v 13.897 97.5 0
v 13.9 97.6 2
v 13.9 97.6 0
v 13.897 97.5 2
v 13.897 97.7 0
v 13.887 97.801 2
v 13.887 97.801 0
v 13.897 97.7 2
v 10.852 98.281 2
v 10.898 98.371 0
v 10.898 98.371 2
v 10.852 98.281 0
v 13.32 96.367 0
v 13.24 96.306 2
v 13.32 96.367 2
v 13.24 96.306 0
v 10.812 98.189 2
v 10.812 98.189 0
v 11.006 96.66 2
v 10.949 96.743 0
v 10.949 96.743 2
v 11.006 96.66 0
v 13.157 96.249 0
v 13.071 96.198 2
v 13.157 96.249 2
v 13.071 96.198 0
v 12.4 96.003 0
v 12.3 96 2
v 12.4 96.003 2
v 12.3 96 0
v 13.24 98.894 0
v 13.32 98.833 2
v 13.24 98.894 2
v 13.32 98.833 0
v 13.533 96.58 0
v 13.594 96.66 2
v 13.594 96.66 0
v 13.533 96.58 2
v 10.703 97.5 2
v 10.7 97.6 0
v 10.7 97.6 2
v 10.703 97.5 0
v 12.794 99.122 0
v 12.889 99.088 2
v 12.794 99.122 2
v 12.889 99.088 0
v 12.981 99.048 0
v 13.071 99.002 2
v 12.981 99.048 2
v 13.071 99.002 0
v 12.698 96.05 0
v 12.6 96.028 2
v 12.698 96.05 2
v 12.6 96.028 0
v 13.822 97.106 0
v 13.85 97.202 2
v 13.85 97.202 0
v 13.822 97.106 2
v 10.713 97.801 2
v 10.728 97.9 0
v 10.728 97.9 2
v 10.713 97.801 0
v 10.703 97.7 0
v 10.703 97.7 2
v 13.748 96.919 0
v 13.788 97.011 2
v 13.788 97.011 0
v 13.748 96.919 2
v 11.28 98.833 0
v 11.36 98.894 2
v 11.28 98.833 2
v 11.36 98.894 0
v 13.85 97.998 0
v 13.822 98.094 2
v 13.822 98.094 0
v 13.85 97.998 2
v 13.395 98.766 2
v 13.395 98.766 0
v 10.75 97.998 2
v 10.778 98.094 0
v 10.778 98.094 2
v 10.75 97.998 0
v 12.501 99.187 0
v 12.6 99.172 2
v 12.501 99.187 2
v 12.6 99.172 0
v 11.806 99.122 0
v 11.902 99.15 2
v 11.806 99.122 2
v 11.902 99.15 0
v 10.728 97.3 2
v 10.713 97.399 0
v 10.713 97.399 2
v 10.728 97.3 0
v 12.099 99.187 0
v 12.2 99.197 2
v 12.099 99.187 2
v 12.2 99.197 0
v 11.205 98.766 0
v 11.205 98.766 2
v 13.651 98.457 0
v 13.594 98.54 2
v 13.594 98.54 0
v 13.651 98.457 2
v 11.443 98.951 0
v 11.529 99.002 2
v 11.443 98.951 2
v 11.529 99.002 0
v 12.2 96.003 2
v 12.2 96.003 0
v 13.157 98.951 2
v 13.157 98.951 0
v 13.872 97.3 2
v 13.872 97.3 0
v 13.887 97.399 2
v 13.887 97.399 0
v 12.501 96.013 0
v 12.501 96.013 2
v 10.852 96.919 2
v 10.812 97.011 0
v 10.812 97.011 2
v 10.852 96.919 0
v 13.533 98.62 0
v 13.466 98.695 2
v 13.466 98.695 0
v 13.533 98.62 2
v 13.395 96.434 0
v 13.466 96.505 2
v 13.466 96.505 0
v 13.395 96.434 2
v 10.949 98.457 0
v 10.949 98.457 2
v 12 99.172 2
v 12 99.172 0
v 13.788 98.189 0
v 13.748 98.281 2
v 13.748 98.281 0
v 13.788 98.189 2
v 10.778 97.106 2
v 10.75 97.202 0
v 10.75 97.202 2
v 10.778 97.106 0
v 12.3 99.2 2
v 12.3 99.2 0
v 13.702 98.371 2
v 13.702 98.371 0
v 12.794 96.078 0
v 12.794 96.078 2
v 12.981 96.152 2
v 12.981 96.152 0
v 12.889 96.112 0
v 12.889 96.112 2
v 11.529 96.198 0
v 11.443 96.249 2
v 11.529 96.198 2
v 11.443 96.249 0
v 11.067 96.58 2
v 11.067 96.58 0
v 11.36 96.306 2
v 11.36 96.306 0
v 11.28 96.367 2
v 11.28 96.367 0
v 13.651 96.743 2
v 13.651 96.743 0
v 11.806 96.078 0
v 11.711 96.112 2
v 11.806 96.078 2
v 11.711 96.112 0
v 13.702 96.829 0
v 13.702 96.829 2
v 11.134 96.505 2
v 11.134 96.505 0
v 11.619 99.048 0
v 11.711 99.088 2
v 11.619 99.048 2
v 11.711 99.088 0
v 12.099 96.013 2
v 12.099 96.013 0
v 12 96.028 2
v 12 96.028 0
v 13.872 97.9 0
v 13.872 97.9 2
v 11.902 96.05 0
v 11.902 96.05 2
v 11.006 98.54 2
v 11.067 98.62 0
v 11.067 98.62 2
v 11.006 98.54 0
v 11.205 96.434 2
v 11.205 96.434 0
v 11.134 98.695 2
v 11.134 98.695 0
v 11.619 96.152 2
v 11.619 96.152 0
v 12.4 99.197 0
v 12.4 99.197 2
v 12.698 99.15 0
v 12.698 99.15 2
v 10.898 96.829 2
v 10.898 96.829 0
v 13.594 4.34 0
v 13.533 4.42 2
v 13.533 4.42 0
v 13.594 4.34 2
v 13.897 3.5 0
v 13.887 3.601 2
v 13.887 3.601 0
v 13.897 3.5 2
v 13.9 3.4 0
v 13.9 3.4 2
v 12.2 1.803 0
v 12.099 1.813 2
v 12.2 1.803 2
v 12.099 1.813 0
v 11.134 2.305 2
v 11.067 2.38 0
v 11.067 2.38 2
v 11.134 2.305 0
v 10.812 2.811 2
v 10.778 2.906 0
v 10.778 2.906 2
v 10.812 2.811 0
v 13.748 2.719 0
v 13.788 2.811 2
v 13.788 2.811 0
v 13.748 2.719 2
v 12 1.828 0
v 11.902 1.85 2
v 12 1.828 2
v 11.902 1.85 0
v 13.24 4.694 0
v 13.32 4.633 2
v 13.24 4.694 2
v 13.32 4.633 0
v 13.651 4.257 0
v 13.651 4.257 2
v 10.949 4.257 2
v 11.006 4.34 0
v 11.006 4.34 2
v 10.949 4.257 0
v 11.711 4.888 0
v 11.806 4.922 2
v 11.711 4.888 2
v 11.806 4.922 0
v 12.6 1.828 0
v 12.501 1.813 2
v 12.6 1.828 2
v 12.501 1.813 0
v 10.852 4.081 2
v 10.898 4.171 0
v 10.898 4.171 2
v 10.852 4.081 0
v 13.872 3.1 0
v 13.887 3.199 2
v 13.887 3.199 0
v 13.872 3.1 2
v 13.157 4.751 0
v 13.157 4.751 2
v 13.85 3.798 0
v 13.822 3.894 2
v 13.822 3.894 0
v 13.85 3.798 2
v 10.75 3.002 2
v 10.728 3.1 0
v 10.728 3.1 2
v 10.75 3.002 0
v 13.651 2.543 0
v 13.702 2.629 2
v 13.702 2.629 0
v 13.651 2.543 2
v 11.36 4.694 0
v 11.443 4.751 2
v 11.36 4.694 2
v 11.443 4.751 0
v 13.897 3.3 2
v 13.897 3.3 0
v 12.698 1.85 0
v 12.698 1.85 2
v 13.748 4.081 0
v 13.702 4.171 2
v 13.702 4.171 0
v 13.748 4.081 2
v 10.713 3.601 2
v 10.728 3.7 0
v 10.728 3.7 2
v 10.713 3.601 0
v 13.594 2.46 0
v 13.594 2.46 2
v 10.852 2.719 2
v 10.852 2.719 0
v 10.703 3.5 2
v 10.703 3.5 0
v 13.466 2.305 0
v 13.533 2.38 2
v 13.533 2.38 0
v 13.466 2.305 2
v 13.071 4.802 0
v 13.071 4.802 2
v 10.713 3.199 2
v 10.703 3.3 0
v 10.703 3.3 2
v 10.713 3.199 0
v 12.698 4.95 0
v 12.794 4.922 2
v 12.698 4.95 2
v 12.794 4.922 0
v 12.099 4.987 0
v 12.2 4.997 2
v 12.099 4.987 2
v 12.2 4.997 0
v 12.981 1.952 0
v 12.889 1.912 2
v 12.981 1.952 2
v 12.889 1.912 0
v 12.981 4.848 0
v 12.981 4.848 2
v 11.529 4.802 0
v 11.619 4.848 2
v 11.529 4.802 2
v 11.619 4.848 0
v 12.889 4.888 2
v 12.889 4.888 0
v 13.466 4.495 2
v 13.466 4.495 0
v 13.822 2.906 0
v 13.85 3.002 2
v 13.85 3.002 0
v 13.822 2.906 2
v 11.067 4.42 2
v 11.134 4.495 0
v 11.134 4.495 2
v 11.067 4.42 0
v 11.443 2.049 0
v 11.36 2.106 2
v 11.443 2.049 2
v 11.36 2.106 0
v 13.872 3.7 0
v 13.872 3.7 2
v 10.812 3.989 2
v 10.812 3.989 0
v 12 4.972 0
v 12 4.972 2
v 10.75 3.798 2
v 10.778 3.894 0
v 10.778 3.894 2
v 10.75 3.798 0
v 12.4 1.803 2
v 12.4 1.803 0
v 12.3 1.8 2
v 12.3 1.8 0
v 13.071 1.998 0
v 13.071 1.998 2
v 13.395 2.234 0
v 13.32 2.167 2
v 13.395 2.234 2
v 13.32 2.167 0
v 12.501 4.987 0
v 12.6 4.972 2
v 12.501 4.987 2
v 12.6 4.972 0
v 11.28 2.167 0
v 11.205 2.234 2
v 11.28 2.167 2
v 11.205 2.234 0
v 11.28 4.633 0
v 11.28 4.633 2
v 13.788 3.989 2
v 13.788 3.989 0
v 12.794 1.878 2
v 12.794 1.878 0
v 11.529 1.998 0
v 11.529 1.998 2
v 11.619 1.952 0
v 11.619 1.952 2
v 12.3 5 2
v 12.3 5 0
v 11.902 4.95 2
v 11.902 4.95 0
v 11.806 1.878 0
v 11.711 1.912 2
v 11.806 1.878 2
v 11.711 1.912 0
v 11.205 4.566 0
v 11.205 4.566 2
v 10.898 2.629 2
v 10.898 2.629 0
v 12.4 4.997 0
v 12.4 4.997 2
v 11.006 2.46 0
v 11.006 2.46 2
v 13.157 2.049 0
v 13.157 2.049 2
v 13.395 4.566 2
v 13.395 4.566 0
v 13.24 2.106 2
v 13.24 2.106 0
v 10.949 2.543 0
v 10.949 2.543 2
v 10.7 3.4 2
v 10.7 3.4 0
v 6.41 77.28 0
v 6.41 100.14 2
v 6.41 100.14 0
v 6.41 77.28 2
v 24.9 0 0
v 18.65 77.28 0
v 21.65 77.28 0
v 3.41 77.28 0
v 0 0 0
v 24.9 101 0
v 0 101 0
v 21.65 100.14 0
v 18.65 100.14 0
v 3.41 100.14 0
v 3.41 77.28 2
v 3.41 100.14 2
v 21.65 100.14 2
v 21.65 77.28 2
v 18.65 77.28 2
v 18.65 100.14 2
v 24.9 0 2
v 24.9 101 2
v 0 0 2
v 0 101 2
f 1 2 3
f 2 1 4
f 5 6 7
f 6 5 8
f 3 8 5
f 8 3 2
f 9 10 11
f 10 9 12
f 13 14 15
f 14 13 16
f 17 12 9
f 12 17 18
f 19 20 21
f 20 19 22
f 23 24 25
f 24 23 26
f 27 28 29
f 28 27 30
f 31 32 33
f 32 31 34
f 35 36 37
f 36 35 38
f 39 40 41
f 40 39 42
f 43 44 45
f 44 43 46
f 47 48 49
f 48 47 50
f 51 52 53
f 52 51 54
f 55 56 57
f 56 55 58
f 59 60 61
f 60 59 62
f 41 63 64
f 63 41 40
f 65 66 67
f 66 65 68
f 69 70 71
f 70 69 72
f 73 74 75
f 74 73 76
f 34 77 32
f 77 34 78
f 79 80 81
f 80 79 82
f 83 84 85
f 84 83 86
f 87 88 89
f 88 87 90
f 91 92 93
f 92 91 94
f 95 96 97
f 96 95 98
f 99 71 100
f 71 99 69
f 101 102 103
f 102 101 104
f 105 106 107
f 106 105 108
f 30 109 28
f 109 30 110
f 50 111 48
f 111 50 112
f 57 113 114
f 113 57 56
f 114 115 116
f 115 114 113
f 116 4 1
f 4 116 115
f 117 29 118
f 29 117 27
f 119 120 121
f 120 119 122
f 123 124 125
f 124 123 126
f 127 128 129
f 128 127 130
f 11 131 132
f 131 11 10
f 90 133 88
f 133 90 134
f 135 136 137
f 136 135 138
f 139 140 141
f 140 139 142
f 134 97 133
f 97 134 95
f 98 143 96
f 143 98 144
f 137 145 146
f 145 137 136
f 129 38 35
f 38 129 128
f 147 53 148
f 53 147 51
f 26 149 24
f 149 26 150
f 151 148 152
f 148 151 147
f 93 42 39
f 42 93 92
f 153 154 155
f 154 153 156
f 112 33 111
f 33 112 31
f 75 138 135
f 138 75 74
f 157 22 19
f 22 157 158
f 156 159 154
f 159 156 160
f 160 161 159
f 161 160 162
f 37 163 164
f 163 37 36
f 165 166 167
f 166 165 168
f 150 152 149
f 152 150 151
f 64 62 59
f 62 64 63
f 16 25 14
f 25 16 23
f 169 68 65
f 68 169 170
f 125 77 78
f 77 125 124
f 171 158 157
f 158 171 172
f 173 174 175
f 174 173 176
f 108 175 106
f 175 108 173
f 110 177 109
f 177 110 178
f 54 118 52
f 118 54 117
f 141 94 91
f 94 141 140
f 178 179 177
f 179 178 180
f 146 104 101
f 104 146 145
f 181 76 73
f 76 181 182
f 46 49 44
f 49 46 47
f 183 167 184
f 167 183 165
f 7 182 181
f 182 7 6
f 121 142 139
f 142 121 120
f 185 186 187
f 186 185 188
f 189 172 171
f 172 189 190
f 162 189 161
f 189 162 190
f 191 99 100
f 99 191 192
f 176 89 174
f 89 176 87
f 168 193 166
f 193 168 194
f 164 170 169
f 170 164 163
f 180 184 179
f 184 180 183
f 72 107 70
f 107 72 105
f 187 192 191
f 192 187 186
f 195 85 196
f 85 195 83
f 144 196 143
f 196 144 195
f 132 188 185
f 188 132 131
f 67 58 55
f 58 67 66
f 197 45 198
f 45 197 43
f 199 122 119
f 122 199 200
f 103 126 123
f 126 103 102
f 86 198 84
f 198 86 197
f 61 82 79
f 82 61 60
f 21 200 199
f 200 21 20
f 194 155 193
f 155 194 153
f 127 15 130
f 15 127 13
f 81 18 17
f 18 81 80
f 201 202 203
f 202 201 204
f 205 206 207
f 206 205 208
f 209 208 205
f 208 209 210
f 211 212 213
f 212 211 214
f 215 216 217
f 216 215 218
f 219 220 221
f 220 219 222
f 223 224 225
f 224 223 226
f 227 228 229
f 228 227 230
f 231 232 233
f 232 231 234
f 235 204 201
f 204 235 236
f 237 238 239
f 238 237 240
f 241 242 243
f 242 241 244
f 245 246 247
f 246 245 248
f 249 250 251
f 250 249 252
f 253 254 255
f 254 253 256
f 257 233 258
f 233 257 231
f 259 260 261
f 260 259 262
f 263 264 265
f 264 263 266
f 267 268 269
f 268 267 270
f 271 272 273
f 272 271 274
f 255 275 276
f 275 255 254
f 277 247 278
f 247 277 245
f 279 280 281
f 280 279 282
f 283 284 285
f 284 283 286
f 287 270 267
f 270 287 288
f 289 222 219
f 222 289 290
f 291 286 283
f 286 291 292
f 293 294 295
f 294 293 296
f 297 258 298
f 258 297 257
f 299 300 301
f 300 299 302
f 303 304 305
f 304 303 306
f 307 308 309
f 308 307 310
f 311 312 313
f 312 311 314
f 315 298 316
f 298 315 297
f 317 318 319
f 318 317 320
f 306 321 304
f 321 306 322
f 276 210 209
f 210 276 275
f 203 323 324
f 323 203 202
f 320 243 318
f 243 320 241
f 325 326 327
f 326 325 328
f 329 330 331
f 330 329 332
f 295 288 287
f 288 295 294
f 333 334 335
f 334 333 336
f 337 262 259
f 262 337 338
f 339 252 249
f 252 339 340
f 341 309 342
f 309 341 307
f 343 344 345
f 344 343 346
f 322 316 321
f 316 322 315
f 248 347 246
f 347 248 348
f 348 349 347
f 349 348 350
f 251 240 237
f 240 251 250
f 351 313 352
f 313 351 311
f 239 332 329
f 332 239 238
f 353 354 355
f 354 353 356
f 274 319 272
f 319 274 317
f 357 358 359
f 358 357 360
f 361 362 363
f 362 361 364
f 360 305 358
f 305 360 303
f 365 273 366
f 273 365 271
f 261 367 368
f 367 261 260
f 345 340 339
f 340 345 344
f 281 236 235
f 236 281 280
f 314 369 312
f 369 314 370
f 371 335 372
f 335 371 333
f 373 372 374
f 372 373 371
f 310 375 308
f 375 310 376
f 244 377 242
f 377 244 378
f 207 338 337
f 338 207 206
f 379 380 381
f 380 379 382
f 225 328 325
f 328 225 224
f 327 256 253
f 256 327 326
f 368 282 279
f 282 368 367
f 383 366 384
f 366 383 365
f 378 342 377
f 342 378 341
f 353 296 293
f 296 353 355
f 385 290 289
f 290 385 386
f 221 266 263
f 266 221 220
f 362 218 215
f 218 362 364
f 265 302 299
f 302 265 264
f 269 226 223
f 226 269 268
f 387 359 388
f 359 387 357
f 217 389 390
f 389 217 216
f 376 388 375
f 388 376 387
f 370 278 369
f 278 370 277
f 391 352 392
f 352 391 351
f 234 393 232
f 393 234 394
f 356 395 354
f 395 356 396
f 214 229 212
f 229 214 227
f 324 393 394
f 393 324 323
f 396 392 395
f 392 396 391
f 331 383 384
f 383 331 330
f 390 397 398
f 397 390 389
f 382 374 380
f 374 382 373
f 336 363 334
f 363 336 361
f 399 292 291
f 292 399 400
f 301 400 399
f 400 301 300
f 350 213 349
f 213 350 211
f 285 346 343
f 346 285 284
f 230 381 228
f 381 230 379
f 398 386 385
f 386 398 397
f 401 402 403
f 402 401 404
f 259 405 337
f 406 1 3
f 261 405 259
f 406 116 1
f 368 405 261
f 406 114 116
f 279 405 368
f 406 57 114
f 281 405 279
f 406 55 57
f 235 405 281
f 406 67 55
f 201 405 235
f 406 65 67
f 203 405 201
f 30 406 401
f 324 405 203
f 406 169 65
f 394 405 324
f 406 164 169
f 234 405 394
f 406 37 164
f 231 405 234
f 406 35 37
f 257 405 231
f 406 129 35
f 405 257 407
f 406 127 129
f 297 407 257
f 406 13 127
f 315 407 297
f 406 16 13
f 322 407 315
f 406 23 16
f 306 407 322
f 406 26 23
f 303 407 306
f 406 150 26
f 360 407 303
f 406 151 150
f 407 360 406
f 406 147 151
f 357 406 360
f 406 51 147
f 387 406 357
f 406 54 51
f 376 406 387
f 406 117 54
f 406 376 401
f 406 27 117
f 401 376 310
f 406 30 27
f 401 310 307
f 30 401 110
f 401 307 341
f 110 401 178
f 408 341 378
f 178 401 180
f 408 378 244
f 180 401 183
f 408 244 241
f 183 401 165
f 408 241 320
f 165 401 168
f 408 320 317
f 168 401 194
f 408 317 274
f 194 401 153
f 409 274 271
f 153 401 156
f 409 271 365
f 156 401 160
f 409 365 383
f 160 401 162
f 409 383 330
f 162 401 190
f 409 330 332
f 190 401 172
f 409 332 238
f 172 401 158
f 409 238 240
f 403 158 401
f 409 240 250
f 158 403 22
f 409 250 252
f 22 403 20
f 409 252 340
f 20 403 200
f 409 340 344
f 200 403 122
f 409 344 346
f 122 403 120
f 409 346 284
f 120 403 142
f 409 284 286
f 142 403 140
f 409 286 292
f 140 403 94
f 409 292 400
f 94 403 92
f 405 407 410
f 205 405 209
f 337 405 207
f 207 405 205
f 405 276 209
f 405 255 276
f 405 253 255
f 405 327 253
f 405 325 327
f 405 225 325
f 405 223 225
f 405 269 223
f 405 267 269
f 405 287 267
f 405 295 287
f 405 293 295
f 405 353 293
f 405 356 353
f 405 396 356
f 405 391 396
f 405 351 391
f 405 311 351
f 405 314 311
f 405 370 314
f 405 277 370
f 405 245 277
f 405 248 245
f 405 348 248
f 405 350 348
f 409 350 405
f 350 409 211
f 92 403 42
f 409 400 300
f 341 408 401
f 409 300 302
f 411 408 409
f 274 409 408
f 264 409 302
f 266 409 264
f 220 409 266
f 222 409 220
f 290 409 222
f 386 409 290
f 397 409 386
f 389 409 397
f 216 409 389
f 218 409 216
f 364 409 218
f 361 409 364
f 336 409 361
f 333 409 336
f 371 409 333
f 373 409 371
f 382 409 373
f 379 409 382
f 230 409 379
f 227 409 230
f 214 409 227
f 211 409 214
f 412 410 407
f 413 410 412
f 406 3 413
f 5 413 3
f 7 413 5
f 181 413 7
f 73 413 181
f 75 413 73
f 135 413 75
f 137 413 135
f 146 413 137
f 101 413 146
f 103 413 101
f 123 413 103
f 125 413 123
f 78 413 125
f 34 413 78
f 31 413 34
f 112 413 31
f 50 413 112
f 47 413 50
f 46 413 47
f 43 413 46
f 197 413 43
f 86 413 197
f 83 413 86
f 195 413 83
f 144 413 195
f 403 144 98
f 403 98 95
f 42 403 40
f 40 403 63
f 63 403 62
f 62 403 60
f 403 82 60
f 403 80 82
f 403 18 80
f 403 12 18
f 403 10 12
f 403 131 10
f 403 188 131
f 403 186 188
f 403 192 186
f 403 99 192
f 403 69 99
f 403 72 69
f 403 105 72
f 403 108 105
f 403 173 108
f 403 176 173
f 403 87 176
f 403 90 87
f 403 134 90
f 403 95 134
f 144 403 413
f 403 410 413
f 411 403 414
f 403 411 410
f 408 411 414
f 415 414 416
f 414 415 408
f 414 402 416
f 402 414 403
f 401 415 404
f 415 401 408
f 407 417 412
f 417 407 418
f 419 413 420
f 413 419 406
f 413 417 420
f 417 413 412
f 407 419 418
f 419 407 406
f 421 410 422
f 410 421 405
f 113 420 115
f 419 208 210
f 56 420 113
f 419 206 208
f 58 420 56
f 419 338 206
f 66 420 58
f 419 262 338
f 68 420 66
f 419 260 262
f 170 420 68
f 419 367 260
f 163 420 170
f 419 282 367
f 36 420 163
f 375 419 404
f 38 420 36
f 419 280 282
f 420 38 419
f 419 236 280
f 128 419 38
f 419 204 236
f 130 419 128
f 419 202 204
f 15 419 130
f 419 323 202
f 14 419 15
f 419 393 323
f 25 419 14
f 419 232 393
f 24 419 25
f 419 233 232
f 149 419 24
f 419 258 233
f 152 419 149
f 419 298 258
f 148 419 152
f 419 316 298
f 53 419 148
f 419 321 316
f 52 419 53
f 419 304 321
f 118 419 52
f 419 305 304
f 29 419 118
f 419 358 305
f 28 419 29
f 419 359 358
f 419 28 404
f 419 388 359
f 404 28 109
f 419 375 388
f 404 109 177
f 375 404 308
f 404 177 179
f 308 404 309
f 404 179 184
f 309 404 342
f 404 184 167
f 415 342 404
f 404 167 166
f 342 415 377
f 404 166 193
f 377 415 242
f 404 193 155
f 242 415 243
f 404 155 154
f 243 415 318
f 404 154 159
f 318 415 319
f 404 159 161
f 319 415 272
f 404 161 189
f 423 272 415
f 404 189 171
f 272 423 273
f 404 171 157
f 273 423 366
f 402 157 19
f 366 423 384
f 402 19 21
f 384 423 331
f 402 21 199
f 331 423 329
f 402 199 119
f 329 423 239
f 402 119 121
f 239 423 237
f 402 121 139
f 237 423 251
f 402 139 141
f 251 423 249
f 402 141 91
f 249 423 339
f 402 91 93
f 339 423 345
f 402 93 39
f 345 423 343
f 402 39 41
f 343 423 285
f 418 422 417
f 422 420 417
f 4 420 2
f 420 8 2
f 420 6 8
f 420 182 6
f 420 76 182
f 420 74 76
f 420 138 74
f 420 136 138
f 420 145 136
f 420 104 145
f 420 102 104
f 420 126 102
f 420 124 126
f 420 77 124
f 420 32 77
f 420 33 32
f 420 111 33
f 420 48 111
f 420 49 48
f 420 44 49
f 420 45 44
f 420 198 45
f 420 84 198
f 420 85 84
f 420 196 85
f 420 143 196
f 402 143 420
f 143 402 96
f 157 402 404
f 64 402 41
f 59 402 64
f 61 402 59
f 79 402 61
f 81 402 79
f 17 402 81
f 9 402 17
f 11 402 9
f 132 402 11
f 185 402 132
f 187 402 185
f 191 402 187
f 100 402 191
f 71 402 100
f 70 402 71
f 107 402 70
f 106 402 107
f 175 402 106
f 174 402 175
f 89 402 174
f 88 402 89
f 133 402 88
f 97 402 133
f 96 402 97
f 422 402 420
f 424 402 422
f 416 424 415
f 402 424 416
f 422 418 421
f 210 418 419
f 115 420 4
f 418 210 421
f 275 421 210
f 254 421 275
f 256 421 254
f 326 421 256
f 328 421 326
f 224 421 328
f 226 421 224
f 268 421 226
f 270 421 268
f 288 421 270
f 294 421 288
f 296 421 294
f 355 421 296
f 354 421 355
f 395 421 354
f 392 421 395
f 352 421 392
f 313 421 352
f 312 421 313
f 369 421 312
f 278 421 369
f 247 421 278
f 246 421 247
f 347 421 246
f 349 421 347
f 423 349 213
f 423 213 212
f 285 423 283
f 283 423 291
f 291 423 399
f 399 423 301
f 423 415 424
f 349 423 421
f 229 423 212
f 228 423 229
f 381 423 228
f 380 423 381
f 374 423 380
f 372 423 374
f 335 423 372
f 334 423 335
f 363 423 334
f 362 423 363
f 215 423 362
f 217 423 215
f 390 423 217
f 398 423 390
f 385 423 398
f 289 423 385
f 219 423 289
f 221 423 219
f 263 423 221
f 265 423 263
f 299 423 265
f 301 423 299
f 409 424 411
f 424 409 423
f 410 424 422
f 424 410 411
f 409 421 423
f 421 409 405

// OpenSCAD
// file: components/pot_rv09.scad
// Based on Alpha RV09
tolerance = 0.3;
$fn = $preview ? 20 : 100;

module pot_rv09() {
    
    translate([0, 7.5, 0]){
        translate([0, 0, 0])
        cylinder(r = 3.5 + tolerance, h = 8);

        //translate([-1, -6.5, 0])
        //cube([2, 3, 1]);
        
        translate([0, 0, -10])
            union() {
                translate([-5, -6.5, 0])
                cube([10, 12, 10]);
            }
    }
}

pot_rv09();
// file: components/led.scad
tolerance = 0.3;
$fn = $preview ? 20 : 100;

module led(d = 3) {
    translate([0, 1.5, 0]){
        cylinder(d = d + (2 * tolerance), h = 2.5);
        
        translate([0, 0, -4])
        cylinder(d = d + 1 + (2 * tolerance), h = 4);
        
        translate([0, -1.5, -7])
        cube([0.8, 0.8, 7], center=true);
        
        translate([0, 1.5, -5])
        cube([0.8, 0.8, 5], center=true);   
    }
}

led();
// main file
use <components/led.scad>
use <components/pot_rv09.scad>

title = "";
units = 1;
inputs = 8;
outputs = 8;

text_depth = 1.4;
gap_tolerance = 0.5;

panel_thickness = 2;
panel_height = 101;
panel_width = 25.4 * units - gap_tolerance;

// Set deep components sit inside the panel
component_depth = 1;

// Position of left mounting holes
mount_position_x = 12.3;

// For perfboard builds, align everything to left mounting holes (bottom-left)
start_y = 3.4;
start_x = mount_position_x - 10.16;

title_x = panel_width / 2;
title_y = panel_height - 25;
title_font_size = 3;
title_font = "Liberation Sans:style=bold";
title_rotate = 0;

input_hole_x = start_x + 1.27;
input_hole_height = 2.54 * inputs + 2.54;

output_hole_x = start_x + 25.4 * units - 2.54 * 3 - 1.27;
output_hole_height = 2.54 * outputs + 2.54;

pots_rv09 = [];

leds = [];

pot_label_distance = 12;
pot_label_font_size = 3;
label_font = "Liberation Sans:style=bold";

module generate_panel(){
    $fn = $preview ? 20 : 100;

    difference(){
        cube([panel_width, panel_height, panel_thickness]);
        union(){
            generate_title();
            generate_mounting_holes();
            generate_input_holes();
            generate_output_holes();
            
            // == Generate components ==
            for (idx = [0 : len(pots_rv09)]) {
                if (pots_rv09[idx]) {
                    echo("POTS RD901F:", idx = pots_rv09[idx]);
                    generate_pots_rv09(
                        pots_rv09[idx][0] * 2.54,
                        pots_rv09[idx][1] * 2.54,
                        pots_rv09[idx]);
                }
            }
            
            for (idx = [0 : len(leds)]) {
                if (leds[idx]) {
                    echo("LED:", idx = leds[idx]);
                    generate_leds(
                        leds[idx][0] * 2.54,
                        leds[idx][1] * 2.54);
                }
            }

        }
    }
}

module generate_input_holes(){
    
    if (inputs != 0){
        translate([input_hole_x, panel_height - input_hole_height - 0.86])
        #cube([3, input_hole_height, 4]);
    }
    }

module generate_output_holes(){
    translate([output_hole_x, panel_height - output_hole_height - 0.86])
    #cube([3, output_hole_height, 4]);}

module generate_title(){
    translate([title_x, title_y, panel_thickness - text_depth])
    rotate([0, 0, title_rotate])
    linear_extrude(height=text_depth + 1)
    text(title, font=title_font, size=title_font_size, halign="center");     
}

module generate_mounting_holes(){
    
    // Top-Left
    translate([12.3, panel_height - 3.4, 0])
    cylinder(r = 1.6, h = 10, center = true);
   
    // Bottom-Left
    translate([12.3, 3.4, 0])
    cylinder(r = 1.6, h = 10, center = true);
    
    if (units > 1) {
        // Top-Right
        translate([panel_width - 12.3, panel_height - 3.4, 0])
        cylinder(r = 1.6, h = 10, center = true);
       
        // Bottom-Right
        translate([panel_width - 12.3, 3.4, 0])
        cylinder(r = 1.6, h = 10, center = true);
    
    }
}

// == Component generators ==
module generate_leds(x, y, size=3){
    translate([x, y, component_depth])
    #led(d = size);
}

module generate_pots_rv09(x, y, params) {
    middle_y = 7.5;

    translate([x, y, component_depth])
    rotate([0, 0, params[3] ? params[3] : 0])
        #pot_rv09();

    translate([
        x,
        y + middle_y + pot_label_distance,
        panel_thickness - text_depth])

        linear_extrude(height = text_depth + 2)
        text(
            params[2],
            font=label_font,
            size=pot_label_font_size,
            halign="center",
            valign="center");
}
// ====

generate_panel();
